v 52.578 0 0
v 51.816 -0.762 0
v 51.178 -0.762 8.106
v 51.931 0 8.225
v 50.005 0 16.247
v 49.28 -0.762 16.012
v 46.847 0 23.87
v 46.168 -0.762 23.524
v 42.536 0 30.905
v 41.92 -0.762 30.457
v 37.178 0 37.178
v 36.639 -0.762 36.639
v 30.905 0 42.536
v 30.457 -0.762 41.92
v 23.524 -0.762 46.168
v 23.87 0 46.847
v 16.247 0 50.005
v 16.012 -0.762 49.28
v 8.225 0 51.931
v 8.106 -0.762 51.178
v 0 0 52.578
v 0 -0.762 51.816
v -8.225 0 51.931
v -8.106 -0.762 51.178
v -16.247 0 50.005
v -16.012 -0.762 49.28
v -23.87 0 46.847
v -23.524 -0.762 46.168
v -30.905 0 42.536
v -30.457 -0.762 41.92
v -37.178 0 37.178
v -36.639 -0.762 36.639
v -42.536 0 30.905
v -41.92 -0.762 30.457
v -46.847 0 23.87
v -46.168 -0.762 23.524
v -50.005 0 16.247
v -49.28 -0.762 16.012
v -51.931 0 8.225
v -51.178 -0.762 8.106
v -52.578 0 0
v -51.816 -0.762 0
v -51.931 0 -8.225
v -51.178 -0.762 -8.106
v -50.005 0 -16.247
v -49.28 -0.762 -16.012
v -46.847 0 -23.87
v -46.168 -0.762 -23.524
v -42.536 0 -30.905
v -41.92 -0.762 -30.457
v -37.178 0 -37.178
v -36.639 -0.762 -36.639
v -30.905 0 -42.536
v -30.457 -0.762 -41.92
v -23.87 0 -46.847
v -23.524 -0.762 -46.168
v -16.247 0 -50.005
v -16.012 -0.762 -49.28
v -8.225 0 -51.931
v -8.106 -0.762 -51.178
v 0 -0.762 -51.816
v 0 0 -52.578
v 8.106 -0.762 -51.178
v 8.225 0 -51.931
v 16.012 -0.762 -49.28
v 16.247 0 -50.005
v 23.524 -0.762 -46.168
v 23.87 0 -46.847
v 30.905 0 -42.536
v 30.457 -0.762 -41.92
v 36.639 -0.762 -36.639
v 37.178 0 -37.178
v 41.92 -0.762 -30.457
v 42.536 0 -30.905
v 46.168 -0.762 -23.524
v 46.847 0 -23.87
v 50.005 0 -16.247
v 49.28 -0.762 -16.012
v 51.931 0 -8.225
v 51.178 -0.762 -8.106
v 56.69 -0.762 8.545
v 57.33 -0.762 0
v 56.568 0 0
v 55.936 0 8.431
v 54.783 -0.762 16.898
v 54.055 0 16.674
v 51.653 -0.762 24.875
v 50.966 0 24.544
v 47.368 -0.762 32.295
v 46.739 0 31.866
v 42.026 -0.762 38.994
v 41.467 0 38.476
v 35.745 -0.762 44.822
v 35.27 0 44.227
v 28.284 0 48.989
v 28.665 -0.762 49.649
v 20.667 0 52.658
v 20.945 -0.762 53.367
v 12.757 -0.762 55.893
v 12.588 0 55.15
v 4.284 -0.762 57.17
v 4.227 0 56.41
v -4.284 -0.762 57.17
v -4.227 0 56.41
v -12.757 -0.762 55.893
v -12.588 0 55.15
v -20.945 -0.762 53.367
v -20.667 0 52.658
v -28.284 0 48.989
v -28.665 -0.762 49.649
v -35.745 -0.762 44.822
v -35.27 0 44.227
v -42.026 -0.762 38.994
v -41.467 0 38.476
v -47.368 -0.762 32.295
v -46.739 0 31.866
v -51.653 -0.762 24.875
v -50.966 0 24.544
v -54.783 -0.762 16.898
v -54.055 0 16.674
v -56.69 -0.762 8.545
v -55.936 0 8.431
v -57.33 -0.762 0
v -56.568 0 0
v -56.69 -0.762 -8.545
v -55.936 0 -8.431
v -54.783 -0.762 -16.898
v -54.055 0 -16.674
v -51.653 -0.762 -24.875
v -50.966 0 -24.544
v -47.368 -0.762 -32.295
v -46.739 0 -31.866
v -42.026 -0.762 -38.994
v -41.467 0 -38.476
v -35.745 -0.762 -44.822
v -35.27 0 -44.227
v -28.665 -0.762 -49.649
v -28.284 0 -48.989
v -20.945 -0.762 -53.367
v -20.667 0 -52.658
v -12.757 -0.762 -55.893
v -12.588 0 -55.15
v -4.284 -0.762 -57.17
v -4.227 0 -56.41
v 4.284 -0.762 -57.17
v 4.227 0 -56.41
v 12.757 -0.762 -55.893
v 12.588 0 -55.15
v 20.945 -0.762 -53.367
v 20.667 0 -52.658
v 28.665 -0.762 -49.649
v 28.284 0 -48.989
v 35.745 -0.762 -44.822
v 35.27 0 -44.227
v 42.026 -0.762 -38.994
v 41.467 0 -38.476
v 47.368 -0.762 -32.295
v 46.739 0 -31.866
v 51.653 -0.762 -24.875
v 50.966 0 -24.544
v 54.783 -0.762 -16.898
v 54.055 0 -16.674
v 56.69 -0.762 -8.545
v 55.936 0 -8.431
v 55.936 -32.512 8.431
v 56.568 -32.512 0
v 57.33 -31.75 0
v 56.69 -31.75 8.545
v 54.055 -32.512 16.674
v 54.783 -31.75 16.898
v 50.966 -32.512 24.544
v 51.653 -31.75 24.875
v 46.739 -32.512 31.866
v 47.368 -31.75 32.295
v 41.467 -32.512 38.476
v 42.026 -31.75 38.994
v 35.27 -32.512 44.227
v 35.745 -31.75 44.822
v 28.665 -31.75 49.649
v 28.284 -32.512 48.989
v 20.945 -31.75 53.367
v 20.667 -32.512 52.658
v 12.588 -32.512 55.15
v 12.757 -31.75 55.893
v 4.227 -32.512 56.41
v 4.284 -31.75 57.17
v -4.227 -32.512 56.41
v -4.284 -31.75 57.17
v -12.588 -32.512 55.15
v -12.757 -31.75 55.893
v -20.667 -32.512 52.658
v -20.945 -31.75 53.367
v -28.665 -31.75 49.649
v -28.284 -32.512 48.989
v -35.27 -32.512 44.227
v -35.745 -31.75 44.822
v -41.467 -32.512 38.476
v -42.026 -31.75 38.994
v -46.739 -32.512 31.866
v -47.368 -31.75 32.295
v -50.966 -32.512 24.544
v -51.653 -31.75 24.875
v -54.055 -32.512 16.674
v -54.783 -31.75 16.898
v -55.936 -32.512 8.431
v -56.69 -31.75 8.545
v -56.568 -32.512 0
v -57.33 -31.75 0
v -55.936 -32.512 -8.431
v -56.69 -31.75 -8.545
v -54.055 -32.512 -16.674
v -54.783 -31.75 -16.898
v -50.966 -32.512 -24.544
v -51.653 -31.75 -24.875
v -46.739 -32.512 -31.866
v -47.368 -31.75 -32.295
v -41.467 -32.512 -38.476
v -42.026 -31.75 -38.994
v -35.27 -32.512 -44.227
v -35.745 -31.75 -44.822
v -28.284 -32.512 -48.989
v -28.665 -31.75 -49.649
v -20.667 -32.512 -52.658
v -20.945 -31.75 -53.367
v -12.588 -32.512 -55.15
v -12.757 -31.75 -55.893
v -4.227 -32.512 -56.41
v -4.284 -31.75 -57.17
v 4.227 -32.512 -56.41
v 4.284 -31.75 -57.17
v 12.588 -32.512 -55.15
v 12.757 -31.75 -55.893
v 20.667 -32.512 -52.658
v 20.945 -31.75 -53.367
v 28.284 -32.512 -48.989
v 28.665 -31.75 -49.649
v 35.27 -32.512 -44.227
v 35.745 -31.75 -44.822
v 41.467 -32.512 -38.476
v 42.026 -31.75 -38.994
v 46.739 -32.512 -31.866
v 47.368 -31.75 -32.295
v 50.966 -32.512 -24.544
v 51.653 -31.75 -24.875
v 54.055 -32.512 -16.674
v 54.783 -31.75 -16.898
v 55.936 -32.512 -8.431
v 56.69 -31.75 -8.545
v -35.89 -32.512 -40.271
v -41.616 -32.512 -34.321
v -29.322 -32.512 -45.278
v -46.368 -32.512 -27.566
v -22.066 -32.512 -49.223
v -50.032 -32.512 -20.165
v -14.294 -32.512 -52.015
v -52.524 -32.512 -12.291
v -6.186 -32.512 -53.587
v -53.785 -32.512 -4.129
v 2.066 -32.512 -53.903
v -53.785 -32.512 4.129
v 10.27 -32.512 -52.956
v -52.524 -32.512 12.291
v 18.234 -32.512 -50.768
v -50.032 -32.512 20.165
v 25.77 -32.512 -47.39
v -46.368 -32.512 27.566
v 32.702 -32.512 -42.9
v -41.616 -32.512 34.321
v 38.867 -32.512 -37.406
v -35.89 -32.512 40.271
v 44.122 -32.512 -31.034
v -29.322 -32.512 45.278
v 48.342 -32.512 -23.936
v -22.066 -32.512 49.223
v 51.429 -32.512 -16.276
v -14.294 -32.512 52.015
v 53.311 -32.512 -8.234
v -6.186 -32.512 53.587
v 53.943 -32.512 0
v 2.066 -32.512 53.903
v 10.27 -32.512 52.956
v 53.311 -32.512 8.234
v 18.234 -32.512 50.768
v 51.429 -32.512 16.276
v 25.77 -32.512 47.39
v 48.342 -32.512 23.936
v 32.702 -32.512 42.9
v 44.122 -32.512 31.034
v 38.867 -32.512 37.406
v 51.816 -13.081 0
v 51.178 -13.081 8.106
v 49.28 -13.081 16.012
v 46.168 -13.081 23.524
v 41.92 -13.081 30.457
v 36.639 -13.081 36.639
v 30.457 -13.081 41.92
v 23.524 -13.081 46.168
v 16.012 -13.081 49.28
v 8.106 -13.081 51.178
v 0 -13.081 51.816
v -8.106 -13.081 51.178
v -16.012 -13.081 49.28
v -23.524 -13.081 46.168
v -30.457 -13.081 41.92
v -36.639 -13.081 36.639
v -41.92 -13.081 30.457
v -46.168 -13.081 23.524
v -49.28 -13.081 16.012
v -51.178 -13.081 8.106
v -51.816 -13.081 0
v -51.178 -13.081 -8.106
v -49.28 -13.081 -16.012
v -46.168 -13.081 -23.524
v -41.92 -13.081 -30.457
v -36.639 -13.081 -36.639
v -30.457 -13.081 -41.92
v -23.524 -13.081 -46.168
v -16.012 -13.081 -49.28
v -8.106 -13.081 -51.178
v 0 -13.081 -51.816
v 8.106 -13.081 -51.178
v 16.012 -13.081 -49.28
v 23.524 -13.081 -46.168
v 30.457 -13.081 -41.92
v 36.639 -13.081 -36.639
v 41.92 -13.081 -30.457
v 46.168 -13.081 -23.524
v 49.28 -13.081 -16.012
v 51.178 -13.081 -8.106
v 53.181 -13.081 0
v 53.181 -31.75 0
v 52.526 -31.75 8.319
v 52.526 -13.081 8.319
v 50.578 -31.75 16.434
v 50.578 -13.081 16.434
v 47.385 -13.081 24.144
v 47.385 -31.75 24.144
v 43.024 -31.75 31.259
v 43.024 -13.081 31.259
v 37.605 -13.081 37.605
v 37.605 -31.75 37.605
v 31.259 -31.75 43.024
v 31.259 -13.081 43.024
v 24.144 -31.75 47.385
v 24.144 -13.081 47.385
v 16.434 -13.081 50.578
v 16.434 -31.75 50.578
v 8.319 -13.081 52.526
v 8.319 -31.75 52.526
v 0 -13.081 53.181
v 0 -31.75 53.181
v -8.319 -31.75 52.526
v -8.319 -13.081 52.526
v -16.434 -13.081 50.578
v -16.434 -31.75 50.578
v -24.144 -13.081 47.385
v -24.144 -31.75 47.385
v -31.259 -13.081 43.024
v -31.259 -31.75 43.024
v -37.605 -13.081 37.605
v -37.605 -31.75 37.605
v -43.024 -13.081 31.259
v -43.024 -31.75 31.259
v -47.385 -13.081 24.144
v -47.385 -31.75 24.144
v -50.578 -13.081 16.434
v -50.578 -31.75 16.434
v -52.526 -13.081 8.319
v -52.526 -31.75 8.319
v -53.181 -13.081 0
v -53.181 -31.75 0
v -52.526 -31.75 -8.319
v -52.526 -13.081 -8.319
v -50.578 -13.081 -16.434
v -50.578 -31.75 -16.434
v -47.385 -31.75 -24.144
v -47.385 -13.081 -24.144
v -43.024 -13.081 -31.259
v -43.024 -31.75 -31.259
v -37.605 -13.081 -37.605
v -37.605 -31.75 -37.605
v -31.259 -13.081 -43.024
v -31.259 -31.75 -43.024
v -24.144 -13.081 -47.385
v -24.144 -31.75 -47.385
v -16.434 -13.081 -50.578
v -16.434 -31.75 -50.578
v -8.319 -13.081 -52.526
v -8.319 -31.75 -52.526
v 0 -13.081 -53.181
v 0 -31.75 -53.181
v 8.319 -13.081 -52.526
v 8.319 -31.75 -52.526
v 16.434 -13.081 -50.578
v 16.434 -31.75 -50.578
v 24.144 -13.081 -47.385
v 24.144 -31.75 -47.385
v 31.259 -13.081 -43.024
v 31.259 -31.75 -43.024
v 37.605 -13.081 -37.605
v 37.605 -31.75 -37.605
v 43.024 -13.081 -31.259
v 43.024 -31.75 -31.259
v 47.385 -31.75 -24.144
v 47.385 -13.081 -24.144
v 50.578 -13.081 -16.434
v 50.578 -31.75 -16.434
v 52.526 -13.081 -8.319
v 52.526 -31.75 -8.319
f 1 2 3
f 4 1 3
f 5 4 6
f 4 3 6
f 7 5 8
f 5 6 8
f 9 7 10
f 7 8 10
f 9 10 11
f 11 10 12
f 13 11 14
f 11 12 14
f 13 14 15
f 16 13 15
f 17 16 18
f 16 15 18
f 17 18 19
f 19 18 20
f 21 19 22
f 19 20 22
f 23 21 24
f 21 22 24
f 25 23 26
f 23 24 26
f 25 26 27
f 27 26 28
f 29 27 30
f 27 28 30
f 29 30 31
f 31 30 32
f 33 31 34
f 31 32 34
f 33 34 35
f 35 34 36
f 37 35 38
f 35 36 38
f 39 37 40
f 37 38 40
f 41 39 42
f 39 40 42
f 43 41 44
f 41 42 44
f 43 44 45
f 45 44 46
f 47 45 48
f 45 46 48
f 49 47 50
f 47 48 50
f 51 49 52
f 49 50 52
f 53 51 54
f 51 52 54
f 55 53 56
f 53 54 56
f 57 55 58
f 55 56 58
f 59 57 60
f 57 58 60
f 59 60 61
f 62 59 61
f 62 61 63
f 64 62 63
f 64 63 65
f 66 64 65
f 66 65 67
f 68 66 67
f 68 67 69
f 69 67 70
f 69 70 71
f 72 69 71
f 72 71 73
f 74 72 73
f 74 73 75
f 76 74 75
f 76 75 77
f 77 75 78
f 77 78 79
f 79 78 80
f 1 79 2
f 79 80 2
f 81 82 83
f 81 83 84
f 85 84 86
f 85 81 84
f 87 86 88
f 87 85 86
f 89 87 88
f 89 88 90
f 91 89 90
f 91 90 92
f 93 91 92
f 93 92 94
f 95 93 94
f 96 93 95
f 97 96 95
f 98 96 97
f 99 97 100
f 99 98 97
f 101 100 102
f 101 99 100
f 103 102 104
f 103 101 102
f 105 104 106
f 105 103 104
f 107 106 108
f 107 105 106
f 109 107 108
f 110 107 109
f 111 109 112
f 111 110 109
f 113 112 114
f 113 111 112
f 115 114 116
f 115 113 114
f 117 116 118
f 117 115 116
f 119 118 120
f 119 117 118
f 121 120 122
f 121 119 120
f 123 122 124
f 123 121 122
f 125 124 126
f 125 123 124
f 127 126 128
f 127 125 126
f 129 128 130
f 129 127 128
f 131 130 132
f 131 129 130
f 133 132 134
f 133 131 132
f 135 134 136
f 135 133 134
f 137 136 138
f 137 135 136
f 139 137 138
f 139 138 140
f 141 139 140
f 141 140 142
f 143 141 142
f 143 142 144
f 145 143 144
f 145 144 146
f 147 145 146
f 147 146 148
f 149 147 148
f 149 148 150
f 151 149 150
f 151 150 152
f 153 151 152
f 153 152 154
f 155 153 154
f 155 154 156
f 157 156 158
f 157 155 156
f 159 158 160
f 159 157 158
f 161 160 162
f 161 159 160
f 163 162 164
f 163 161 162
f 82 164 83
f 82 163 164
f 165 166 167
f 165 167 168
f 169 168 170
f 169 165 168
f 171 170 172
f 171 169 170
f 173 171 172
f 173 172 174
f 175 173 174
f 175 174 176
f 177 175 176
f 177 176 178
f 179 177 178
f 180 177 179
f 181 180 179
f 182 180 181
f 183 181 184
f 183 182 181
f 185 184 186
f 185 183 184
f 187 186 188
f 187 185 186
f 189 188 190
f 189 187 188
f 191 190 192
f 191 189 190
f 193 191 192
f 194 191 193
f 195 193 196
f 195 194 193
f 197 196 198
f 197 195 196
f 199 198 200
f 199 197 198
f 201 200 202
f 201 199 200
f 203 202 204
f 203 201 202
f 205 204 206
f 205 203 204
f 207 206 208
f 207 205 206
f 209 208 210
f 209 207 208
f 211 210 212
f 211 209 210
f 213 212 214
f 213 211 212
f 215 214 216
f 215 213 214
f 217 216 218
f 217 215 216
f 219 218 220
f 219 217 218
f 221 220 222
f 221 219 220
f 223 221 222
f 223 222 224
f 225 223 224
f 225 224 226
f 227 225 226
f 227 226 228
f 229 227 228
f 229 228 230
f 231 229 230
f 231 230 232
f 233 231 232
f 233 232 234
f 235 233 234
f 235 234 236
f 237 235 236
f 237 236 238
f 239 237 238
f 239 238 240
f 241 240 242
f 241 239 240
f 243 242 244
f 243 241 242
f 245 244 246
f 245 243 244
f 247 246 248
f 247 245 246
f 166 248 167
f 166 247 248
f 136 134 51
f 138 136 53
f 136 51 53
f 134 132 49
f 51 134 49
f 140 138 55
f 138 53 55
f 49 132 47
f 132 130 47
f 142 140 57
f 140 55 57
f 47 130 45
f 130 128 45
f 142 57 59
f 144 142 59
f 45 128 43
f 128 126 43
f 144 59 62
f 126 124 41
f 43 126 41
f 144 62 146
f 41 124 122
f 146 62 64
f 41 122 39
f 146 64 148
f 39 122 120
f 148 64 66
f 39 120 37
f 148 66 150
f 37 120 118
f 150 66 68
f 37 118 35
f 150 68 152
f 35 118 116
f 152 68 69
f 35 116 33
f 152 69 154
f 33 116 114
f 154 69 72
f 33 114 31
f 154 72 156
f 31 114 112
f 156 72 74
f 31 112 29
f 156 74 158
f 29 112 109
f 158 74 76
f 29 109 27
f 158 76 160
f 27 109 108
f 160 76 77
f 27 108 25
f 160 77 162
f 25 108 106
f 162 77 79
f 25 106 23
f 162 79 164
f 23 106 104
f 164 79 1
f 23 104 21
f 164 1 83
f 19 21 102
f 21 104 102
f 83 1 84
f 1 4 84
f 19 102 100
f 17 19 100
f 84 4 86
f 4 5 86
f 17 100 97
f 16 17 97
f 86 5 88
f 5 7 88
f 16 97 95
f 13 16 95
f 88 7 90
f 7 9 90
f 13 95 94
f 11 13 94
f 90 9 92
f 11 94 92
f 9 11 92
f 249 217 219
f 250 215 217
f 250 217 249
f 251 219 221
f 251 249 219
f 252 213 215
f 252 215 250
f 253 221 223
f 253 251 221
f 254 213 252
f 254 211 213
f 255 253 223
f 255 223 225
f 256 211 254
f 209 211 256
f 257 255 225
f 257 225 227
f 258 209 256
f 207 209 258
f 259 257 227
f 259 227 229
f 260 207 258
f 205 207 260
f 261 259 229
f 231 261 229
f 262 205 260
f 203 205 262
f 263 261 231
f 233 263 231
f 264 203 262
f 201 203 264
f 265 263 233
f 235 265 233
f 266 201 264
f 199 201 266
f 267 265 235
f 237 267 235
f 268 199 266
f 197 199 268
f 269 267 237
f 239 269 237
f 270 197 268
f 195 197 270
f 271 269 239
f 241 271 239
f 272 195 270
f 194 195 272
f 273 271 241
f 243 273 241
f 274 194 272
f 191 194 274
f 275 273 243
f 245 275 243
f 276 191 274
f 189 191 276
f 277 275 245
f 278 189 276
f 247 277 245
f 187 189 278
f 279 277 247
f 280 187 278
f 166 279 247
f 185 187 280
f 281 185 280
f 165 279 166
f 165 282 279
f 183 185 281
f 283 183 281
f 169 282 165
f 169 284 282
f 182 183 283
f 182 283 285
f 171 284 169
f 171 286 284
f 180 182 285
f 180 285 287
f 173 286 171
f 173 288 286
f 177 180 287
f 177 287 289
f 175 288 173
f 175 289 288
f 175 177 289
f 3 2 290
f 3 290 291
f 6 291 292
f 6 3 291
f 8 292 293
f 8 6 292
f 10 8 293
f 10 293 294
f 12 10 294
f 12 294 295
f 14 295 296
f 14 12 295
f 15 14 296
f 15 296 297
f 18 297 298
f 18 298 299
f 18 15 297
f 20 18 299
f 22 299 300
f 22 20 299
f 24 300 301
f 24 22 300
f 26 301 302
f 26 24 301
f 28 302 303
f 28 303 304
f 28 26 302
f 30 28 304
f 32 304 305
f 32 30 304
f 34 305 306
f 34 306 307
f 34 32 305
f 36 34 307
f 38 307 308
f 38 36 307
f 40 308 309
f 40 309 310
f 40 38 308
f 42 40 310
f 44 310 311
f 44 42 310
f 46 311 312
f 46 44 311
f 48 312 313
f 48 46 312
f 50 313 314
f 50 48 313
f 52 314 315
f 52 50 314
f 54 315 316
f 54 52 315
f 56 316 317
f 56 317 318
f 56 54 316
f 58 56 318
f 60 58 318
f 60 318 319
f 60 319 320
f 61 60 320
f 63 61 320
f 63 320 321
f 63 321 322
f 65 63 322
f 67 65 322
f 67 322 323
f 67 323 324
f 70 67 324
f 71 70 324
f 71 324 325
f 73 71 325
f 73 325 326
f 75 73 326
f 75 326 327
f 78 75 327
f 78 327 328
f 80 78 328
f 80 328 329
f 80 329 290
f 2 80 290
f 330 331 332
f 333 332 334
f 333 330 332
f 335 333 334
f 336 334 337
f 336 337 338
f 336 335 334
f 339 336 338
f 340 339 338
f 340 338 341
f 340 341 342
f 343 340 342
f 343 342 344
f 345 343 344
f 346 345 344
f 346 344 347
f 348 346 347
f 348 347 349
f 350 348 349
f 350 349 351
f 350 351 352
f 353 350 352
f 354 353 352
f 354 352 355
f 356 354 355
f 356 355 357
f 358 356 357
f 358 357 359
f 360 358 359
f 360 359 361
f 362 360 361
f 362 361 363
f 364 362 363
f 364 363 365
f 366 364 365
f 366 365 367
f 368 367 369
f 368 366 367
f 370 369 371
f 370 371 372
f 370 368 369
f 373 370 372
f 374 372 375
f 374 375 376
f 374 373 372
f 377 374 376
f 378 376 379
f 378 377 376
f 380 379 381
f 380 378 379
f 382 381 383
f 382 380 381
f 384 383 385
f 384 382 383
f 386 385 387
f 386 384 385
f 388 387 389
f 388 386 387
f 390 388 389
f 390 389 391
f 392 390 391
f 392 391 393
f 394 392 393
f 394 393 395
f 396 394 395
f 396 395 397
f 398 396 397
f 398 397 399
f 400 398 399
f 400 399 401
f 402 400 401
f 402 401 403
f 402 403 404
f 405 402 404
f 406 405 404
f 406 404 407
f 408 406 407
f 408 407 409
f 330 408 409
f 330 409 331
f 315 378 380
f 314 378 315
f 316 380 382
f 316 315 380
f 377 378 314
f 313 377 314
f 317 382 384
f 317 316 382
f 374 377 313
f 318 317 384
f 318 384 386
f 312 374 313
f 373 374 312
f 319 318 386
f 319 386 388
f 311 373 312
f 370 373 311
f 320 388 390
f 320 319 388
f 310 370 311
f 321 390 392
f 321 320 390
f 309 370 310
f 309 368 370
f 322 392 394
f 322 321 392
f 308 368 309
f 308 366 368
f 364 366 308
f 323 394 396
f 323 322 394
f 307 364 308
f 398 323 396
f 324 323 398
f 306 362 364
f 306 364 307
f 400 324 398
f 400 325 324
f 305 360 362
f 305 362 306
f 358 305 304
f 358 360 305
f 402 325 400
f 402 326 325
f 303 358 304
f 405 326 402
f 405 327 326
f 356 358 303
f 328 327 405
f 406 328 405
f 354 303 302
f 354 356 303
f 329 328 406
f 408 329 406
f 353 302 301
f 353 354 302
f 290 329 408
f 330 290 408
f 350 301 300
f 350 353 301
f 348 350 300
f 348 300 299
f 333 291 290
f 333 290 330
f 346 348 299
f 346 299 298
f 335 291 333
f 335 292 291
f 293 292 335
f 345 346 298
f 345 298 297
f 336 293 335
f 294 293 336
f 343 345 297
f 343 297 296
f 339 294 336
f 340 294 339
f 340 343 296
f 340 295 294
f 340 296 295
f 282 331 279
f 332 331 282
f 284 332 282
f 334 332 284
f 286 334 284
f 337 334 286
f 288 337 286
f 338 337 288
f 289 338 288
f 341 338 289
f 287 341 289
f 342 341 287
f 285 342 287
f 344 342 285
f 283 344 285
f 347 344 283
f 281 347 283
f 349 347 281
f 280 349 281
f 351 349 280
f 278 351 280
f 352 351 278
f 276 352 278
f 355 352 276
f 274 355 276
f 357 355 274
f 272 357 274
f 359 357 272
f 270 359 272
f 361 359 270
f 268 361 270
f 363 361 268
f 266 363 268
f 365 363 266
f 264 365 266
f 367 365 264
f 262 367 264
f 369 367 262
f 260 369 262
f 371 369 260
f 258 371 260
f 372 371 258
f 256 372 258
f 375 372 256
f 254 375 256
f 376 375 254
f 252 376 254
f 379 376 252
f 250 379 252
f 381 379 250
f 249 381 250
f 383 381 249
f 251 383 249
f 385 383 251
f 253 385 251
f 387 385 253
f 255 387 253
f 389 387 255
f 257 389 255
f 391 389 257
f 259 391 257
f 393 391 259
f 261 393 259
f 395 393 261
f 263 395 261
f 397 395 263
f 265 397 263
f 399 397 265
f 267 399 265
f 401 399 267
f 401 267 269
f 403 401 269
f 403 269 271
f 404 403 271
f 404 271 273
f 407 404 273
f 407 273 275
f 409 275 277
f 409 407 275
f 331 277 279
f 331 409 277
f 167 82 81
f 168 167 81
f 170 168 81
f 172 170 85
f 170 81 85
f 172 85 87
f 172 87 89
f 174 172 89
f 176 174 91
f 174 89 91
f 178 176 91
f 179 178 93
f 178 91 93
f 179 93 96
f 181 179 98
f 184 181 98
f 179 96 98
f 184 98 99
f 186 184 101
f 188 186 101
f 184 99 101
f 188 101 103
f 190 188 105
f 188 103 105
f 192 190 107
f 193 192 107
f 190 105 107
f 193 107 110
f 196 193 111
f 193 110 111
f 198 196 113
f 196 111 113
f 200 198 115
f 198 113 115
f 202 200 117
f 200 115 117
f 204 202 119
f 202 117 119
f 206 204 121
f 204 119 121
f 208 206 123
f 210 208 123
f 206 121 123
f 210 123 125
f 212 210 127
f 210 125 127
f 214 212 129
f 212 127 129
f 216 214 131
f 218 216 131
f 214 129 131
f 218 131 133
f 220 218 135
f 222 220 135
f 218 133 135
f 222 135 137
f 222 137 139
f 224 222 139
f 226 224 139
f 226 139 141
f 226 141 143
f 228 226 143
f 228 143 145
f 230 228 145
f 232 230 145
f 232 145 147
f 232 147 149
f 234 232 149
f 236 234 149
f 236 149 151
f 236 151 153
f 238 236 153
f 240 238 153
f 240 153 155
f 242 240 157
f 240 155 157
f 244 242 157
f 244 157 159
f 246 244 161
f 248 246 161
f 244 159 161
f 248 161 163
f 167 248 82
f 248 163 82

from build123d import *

# Parameters (mm, degrees)
F0_R     = 57.329977
F0_R_2   = 53.180957
F1_DEPTH = 32.512
F2_R     = 53.391542
F2_R_2   = 51.816
F3_DEPTH = 13.081
F4_SIZE  = 0.762


with BuildPart() as f1:
    # F0 (on Front) → F1 (new body)
    with BuildSketch(Plane.XZ):
        Circle(F0_R)
        Circle(F0_R_2, mode=Mode.SUBTRACT)
    extrude(amount=F1_DEPTH)

    # F2 (on Front) → F3 (join)
    with BuildSketch(Plane.XZ):
        Circle(F2_R)
        Circle(F2_R_2, mode=Mode.SUBTRACT)
    extrude(amount=F3_DEPTH)

    # F4
    f4_edges = [f1.edges().sort_by_distance(p)[0] for p in [
        (-53.180957, -32.512, 0),
        (-51.816, 0, 0),
        (-57.329977, -32.512, 0),
        (-57.329977, 0, 0),
    ]]
    chamfer(f4_edges, length=F4_SIZE)


solid = f1.part
